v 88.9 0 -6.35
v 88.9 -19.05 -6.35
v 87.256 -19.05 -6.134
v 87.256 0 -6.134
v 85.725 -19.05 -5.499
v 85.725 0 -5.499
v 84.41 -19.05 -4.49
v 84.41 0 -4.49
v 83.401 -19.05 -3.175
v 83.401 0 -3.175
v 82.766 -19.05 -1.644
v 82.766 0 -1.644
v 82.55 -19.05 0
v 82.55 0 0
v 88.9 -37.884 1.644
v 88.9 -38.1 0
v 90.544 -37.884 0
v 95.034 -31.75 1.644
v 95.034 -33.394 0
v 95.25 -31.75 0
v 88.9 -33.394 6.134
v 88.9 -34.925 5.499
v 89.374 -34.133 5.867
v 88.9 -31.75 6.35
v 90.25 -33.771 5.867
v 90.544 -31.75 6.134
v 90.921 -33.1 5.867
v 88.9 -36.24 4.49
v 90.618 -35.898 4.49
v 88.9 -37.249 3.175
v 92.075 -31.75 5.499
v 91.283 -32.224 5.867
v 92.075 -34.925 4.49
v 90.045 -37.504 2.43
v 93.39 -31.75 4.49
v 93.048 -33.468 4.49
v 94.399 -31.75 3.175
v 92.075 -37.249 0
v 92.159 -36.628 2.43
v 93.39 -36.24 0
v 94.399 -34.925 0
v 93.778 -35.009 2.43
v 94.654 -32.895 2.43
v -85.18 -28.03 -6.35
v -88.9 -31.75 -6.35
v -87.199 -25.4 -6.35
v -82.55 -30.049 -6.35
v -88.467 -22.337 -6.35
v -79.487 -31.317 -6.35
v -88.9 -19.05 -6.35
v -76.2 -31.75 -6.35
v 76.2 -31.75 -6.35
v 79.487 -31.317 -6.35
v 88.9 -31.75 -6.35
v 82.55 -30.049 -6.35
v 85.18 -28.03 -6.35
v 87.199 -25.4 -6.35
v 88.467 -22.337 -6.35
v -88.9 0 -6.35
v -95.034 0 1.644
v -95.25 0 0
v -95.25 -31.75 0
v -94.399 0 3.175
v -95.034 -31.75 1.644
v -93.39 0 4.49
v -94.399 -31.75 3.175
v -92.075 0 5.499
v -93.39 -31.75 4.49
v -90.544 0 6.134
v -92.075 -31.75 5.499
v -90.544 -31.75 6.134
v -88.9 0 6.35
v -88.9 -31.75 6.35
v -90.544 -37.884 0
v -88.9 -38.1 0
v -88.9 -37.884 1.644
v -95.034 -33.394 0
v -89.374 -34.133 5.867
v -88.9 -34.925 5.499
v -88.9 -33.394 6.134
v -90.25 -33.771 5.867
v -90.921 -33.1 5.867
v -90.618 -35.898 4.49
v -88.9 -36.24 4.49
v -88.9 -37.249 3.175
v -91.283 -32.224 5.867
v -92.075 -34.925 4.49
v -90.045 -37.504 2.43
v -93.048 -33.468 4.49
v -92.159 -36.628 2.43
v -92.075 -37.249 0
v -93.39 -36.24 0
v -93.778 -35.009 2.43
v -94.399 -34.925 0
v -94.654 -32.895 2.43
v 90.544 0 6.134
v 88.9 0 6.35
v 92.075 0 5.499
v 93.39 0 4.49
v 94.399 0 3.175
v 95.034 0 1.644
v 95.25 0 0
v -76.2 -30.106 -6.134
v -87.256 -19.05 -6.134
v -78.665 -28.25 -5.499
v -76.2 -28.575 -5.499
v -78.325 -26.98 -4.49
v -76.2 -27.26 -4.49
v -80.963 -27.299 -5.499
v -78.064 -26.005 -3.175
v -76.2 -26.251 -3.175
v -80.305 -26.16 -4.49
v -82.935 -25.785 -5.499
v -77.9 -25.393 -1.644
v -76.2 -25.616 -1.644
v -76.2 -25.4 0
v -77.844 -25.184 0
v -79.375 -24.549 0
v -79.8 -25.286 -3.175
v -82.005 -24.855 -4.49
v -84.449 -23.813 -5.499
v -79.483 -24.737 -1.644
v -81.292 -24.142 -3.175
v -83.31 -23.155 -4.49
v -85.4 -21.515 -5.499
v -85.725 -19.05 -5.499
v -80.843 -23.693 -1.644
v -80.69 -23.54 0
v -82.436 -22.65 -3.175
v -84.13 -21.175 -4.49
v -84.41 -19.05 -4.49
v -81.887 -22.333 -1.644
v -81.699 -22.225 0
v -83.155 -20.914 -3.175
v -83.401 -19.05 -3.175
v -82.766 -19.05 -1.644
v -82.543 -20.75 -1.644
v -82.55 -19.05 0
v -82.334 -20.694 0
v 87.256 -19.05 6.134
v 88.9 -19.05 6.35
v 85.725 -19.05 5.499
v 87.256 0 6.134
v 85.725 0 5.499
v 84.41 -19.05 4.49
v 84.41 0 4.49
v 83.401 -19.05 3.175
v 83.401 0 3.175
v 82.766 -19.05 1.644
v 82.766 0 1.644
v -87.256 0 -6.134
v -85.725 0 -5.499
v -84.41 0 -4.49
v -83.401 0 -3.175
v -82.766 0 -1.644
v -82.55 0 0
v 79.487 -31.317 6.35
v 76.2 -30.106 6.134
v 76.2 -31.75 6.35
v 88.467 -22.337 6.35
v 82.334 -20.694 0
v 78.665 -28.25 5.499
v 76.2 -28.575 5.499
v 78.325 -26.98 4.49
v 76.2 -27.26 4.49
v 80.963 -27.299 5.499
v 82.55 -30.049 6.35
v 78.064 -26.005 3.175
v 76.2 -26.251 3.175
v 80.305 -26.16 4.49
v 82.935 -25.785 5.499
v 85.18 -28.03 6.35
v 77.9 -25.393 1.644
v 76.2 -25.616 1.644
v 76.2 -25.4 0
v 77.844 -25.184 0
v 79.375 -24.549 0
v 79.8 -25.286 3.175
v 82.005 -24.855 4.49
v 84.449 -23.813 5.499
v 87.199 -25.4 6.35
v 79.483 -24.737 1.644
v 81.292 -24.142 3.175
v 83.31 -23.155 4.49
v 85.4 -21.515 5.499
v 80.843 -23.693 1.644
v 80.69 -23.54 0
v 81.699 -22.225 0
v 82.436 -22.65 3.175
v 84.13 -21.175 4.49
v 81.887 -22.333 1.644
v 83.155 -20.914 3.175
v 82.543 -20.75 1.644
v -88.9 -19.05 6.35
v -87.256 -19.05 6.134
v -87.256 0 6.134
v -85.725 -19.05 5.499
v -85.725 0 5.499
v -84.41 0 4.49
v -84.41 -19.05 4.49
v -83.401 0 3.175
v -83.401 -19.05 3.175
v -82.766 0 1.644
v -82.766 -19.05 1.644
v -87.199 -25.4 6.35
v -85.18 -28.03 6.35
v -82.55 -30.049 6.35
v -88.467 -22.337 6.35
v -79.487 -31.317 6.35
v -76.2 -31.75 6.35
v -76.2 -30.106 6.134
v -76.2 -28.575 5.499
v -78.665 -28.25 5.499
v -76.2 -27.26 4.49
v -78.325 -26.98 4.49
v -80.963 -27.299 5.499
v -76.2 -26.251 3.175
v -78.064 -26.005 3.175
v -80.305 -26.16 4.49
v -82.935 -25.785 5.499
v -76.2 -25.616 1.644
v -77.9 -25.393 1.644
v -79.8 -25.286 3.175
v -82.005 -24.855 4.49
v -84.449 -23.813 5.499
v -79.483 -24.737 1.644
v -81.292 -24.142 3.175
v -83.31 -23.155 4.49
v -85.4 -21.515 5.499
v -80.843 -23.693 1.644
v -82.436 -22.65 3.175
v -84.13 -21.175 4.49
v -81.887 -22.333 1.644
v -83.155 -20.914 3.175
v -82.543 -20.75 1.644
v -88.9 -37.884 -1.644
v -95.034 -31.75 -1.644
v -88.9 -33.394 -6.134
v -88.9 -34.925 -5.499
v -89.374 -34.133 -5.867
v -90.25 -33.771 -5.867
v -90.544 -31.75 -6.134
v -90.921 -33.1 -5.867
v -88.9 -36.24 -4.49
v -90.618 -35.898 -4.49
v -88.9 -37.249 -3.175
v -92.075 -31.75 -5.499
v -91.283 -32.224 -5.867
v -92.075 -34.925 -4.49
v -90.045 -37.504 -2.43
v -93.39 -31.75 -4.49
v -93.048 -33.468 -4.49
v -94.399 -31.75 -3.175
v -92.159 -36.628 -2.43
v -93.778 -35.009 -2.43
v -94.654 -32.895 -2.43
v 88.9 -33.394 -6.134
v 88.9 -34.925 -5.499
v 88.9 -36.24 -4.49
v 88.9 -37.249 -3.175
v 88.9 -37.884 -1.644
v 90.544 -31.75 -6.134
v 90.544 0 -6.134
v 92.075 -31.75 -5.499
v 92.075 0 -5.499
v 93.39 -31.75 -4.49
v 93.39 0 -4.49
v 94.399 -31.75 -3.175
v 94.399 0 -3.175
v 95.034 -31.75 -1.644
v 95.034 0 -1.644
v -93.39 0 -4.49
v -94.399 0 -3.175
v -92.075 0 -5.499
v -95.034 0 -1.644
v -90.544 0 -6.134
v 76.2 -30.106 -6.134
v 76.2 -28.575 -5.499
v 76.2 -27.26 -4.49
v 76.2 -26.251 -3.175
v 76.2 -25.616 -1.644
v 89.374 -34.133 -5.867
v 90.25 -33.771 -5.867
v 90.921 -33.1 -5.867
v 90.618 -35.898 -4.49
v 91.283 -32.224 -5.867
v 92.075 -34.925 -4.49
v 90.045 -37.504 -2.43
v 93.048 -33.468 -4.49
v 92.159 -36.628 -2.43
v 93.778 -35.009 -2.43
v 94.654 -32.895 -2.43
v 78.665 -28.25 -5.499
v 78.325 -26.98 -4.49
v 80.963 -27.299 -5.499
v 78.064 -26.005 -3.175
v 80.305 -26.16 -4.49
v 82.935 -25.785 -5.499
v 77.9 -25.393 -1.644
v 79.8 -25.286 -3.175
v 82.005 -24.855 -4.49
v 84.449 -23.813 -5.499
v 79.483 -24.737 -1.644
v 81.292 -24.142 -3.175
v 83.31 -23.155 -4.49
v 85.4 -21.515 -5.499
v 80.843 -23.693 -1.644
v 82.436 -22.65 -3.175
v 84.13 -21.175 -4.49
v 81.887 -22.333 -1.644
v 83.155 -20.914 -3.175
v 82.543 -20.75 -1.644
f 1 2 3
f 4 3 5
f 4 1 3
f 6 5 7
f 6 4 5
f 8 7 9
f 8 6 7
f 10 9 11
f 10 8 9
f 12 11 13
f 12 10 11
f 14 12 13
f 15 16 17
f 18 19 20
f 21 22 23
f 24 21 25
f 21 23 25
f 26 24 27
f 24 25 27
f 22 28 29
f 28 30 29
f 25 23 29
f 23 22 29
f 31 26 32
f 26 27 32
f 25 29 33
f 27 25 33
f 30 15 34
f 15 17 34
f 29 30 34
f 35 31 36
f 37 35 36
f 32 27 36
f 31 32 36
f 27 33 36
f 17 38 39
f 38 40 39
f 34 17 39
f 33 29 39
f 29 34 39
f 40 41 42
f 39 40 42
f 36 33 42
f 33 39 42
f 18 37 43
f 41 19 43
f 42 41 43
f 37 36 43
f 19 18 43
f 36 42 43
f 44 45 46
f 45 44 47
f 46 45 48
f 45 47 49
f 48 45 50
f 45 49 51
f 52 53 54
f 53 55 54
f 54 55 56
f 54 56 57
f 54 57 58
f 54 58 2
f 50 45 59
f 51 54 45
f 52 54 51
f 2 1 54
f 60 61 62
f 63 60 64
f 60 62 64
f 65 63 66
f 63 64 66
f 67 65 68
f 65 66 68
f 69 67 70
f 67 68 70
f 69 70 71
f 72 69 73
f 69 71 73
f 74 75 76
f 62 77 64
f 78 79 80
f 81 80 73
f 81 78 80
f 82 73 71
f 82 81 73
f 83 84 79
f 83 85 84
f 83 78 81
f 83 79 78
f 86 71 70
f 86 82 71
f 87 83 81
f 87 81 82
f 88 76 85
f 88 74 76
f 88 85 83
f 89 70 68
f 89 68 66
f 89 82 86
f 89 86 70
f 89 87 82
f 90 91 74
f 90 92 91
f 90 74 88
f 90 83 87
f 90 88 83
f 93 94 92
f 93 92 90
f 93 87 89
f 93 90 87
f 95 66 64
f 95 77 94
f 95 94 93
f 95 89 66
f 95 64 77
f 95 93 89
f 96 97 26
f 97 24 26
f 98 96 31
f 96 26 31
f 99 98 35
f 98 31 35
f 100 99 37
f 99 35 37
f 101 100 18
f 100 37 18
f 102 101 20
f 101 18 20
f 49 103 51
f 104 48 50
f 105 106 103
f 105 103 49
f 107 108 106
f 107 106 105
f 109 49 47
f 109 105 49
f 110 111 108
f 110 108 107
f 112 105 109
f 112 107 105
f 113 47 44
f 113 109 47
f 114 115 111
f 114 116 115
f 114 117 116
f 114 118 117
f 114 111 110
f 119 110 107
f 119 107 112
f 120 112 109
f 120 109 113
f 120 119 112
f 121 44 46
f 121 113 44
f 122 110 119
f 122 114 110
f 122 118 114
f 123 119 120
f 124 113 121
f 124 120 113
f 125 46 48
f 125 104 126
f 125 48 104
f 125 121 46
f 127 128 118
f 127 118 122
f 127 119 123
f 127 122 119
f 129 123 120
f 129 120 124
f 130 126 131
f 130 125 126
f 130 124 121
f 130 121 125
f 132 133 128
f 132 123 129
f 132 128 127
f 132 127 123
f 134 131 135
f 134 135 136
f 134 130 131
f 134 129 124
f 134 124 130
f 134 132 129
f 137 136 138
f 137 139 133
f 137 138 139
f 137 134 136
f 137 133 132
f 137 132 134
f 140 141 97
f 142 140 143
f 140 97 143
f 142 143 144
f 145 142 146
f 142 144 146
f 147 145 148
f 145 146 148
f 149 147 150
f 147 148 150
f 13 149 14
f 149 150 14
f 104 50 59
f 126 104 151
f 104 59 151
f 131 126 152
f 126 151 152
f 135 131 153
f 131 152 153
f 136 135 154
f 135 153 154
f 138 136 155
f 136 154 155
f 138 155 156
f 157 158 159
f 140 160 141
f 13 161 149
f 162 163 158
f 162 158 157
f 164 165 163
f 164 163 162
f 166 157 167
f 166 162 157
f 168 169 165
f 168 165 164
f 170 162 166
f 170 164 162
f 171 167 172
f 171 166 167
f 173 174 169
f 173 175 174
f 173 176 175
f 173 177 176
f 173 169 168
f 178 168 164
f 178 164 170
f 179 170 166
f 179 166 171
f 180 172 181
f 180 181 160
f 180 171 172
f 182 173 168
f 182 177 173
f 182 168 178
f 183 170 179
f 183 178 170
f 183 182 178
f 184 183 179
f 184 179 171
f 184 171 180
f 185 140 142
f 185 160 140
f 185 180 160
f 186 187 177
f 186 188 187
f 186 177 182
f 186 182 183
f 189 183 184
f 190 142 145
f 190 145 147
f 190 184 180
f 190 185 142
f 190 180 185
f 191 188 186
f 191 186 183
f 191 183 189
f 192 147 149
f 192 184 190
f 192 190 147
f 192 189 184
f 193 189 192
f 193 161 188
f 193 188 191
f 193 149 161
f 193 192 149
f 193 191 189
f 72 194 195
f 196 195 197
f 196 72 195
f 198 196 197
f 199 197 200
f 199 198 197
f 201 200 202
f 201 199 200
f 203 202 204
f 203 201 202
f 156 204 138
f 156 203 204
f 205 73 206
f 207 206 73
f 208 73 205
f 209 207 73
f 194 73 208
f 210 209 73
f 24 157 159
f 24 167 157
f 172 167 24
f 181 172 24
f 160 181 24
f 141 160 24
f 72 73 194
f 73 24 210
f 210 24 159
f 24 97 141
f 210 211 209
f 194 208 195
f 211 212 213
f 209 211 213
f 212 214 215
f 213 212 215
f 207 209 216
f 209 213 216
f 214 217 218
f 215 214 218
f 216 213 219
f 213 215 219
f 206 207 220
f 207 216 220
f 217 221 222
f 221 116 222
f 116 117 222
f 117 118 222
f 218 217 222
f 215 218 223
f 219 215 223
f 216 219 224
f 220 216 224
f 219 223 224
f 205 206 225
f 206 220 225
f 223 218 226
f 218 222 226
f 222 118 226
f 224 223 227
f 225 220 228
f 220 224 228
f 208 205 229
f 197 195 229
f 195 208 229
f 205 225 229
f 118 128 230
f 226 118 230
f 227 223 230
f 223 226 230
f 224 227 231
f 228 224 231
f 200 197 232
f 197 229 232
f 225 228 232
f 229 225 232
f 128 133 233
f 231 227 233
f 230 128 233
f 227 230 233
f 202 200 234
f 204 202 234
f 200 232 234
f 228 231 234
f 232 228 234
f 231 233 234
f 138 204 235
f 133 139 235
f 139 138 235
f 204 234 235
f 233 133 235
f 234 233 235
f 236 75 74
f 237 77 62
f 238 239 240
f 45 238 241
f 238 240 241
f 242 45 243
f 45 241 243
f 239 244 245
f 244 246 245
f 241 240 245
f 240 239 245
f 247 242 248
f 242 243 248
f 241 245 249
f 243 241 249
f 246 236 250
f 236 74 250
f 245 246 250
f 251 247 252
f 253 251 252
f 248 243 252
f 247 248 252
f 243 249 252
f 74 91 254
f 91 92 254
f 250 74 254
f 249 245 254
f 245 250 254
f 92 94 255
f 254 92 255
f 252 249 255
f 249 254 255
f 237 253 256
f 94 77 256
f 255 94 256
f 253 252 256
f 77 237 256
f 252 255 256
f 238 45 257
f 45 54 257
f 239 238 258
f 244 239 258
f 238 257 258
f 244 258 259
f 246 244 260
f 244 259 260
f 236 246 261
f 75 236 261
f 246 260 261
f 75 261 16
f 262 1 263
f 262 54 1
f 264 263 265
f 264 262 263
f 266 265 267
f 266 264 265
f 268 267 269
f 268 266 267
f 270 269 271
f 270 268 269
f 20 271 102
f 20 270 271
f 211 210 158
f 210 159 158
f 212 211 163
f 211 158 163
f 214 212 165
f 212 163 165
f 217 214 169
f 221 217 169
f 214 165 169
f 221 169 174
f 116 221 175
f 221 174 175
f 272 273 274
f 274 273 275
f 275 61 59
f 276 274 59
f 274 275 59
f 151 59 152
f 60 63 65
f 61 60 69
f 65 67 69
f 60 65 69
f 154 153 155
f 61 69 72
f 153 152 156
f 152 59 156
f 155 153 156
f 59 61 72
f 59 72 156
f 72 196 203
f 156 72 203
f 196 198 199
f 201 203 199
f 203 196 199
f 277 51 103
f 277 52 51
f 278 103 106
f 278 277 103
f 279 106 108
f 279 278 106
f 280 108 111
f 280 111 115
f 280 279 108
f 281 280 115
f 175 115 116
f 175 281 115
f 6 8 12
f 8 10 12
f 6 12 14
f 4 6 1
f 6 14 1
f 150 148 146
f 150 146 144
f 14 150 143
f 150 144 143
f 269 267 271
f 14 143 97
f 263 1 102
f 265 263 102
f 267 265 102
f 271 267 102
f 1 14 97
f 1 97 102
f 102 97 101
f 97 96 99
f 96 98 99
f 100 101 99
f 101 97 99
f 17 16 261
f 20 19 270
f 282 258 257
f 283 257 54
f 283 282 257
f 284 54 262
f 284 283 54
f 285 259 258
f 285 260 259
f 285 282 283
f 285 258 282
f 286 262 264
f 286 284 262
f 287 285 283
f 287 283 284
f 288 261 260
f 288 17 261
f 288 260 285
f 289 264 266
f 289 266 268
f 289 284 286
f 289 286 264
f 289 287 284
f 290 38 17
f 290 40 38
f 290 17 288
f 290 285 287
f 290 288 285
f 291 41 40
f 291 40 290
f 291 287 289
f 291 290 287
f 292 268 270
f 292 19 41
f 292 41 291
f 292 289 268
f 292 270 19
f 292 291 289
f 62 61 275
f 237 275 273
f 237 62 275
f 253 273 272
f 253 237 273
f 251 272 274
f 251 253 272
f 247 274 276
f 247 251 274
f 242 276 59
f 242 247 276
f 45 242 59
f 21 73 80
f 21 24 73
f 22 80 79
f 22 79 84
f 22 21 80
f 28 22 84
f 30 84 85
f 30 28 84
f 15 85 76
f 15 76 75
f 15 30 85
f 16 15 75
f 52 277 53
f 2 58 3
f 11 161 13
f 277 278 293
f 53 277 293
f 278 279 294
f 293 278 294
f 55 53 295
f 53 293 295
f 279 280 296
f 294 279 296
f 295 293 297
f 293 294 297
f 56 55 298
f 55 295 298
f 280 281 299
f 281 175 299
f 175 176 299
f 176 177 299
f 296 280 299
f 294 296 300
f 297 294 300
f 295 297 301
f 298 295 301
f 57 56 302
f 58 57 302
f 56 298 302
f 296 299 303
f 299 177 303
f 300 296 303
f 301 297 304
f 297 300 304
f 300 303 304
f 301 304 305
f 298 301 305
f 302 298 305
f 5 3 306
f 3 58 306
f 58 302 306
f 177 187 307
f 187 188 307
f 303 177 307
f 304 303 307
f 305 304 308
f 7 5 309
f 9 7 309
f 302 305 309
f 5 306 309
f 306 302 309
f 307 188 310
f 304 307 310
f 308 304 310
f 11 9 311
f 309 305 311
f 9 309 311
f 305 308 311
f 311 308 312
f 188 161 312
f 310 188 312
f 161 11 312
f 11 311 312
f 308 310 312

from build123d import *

# Parameters (mm, degrees)
F0_W     = 190.5
F0_H     = 12.7
F1_DEPTH = 38.1
F2_W     = 165.1
F2_H     = 25.4
F3_DEPTH = 12.701
F4_R     = 6.34999


# Not quite as in the source:
# - a fillet or chamfer is up to 0.001 mm smaller than in the source, because OpenCascade refuses the exact size


with BuildPart() as f1:
    # F0 (on Front) → F1 (new body)
    with BuildSketch(Plane.XZ):
        Rectangle(F0_W, F0_H)
    extrude(amount=F1_DEPTH)

    # F2 (on face) → F3 (cut, through all)
    with BuildSketch(Plane.XY.offset(6.35)):
        with Locations((0, -12.7)):
            Rectangle(F2_W, F2_H)
    extrude(amount=-F3_DEPTH, mode=Mode.SUBTRACT)

    # F4 (radius 6.35 in the source; OpenCascade refuses exactly that, so slightly less here)
    f4_edges = [f1.edges().sort_by_distance(p)[0] for p in [
        (-95.25, -38.1, 0),
        (-82.55, -25.4, 0),
        (95.25, -38.1, 0),
        (82.55, -25.4, 0),
        (0, -38.1, 6.35),
        (0, -25.4, 6.35),
        (0, -38.1, -6.35),
        (0, -25.4, -6.35),
        (-82.55, -12.7, -6.35),
        (-95.25, -19.05, -6.35),
        (82.55, -12.7, -6.35),
        (95.25, -19.05, -6.35),
        (95.25, -19.05, 6.35),
        (-82.55, -12.7, 6.35),
        (-95.25, -19.05, 6.35),
        (82.55, -12.7, 6.35),
    ]]
    fillet(f4_edges, radius=F4_R)


solid = f1.part
